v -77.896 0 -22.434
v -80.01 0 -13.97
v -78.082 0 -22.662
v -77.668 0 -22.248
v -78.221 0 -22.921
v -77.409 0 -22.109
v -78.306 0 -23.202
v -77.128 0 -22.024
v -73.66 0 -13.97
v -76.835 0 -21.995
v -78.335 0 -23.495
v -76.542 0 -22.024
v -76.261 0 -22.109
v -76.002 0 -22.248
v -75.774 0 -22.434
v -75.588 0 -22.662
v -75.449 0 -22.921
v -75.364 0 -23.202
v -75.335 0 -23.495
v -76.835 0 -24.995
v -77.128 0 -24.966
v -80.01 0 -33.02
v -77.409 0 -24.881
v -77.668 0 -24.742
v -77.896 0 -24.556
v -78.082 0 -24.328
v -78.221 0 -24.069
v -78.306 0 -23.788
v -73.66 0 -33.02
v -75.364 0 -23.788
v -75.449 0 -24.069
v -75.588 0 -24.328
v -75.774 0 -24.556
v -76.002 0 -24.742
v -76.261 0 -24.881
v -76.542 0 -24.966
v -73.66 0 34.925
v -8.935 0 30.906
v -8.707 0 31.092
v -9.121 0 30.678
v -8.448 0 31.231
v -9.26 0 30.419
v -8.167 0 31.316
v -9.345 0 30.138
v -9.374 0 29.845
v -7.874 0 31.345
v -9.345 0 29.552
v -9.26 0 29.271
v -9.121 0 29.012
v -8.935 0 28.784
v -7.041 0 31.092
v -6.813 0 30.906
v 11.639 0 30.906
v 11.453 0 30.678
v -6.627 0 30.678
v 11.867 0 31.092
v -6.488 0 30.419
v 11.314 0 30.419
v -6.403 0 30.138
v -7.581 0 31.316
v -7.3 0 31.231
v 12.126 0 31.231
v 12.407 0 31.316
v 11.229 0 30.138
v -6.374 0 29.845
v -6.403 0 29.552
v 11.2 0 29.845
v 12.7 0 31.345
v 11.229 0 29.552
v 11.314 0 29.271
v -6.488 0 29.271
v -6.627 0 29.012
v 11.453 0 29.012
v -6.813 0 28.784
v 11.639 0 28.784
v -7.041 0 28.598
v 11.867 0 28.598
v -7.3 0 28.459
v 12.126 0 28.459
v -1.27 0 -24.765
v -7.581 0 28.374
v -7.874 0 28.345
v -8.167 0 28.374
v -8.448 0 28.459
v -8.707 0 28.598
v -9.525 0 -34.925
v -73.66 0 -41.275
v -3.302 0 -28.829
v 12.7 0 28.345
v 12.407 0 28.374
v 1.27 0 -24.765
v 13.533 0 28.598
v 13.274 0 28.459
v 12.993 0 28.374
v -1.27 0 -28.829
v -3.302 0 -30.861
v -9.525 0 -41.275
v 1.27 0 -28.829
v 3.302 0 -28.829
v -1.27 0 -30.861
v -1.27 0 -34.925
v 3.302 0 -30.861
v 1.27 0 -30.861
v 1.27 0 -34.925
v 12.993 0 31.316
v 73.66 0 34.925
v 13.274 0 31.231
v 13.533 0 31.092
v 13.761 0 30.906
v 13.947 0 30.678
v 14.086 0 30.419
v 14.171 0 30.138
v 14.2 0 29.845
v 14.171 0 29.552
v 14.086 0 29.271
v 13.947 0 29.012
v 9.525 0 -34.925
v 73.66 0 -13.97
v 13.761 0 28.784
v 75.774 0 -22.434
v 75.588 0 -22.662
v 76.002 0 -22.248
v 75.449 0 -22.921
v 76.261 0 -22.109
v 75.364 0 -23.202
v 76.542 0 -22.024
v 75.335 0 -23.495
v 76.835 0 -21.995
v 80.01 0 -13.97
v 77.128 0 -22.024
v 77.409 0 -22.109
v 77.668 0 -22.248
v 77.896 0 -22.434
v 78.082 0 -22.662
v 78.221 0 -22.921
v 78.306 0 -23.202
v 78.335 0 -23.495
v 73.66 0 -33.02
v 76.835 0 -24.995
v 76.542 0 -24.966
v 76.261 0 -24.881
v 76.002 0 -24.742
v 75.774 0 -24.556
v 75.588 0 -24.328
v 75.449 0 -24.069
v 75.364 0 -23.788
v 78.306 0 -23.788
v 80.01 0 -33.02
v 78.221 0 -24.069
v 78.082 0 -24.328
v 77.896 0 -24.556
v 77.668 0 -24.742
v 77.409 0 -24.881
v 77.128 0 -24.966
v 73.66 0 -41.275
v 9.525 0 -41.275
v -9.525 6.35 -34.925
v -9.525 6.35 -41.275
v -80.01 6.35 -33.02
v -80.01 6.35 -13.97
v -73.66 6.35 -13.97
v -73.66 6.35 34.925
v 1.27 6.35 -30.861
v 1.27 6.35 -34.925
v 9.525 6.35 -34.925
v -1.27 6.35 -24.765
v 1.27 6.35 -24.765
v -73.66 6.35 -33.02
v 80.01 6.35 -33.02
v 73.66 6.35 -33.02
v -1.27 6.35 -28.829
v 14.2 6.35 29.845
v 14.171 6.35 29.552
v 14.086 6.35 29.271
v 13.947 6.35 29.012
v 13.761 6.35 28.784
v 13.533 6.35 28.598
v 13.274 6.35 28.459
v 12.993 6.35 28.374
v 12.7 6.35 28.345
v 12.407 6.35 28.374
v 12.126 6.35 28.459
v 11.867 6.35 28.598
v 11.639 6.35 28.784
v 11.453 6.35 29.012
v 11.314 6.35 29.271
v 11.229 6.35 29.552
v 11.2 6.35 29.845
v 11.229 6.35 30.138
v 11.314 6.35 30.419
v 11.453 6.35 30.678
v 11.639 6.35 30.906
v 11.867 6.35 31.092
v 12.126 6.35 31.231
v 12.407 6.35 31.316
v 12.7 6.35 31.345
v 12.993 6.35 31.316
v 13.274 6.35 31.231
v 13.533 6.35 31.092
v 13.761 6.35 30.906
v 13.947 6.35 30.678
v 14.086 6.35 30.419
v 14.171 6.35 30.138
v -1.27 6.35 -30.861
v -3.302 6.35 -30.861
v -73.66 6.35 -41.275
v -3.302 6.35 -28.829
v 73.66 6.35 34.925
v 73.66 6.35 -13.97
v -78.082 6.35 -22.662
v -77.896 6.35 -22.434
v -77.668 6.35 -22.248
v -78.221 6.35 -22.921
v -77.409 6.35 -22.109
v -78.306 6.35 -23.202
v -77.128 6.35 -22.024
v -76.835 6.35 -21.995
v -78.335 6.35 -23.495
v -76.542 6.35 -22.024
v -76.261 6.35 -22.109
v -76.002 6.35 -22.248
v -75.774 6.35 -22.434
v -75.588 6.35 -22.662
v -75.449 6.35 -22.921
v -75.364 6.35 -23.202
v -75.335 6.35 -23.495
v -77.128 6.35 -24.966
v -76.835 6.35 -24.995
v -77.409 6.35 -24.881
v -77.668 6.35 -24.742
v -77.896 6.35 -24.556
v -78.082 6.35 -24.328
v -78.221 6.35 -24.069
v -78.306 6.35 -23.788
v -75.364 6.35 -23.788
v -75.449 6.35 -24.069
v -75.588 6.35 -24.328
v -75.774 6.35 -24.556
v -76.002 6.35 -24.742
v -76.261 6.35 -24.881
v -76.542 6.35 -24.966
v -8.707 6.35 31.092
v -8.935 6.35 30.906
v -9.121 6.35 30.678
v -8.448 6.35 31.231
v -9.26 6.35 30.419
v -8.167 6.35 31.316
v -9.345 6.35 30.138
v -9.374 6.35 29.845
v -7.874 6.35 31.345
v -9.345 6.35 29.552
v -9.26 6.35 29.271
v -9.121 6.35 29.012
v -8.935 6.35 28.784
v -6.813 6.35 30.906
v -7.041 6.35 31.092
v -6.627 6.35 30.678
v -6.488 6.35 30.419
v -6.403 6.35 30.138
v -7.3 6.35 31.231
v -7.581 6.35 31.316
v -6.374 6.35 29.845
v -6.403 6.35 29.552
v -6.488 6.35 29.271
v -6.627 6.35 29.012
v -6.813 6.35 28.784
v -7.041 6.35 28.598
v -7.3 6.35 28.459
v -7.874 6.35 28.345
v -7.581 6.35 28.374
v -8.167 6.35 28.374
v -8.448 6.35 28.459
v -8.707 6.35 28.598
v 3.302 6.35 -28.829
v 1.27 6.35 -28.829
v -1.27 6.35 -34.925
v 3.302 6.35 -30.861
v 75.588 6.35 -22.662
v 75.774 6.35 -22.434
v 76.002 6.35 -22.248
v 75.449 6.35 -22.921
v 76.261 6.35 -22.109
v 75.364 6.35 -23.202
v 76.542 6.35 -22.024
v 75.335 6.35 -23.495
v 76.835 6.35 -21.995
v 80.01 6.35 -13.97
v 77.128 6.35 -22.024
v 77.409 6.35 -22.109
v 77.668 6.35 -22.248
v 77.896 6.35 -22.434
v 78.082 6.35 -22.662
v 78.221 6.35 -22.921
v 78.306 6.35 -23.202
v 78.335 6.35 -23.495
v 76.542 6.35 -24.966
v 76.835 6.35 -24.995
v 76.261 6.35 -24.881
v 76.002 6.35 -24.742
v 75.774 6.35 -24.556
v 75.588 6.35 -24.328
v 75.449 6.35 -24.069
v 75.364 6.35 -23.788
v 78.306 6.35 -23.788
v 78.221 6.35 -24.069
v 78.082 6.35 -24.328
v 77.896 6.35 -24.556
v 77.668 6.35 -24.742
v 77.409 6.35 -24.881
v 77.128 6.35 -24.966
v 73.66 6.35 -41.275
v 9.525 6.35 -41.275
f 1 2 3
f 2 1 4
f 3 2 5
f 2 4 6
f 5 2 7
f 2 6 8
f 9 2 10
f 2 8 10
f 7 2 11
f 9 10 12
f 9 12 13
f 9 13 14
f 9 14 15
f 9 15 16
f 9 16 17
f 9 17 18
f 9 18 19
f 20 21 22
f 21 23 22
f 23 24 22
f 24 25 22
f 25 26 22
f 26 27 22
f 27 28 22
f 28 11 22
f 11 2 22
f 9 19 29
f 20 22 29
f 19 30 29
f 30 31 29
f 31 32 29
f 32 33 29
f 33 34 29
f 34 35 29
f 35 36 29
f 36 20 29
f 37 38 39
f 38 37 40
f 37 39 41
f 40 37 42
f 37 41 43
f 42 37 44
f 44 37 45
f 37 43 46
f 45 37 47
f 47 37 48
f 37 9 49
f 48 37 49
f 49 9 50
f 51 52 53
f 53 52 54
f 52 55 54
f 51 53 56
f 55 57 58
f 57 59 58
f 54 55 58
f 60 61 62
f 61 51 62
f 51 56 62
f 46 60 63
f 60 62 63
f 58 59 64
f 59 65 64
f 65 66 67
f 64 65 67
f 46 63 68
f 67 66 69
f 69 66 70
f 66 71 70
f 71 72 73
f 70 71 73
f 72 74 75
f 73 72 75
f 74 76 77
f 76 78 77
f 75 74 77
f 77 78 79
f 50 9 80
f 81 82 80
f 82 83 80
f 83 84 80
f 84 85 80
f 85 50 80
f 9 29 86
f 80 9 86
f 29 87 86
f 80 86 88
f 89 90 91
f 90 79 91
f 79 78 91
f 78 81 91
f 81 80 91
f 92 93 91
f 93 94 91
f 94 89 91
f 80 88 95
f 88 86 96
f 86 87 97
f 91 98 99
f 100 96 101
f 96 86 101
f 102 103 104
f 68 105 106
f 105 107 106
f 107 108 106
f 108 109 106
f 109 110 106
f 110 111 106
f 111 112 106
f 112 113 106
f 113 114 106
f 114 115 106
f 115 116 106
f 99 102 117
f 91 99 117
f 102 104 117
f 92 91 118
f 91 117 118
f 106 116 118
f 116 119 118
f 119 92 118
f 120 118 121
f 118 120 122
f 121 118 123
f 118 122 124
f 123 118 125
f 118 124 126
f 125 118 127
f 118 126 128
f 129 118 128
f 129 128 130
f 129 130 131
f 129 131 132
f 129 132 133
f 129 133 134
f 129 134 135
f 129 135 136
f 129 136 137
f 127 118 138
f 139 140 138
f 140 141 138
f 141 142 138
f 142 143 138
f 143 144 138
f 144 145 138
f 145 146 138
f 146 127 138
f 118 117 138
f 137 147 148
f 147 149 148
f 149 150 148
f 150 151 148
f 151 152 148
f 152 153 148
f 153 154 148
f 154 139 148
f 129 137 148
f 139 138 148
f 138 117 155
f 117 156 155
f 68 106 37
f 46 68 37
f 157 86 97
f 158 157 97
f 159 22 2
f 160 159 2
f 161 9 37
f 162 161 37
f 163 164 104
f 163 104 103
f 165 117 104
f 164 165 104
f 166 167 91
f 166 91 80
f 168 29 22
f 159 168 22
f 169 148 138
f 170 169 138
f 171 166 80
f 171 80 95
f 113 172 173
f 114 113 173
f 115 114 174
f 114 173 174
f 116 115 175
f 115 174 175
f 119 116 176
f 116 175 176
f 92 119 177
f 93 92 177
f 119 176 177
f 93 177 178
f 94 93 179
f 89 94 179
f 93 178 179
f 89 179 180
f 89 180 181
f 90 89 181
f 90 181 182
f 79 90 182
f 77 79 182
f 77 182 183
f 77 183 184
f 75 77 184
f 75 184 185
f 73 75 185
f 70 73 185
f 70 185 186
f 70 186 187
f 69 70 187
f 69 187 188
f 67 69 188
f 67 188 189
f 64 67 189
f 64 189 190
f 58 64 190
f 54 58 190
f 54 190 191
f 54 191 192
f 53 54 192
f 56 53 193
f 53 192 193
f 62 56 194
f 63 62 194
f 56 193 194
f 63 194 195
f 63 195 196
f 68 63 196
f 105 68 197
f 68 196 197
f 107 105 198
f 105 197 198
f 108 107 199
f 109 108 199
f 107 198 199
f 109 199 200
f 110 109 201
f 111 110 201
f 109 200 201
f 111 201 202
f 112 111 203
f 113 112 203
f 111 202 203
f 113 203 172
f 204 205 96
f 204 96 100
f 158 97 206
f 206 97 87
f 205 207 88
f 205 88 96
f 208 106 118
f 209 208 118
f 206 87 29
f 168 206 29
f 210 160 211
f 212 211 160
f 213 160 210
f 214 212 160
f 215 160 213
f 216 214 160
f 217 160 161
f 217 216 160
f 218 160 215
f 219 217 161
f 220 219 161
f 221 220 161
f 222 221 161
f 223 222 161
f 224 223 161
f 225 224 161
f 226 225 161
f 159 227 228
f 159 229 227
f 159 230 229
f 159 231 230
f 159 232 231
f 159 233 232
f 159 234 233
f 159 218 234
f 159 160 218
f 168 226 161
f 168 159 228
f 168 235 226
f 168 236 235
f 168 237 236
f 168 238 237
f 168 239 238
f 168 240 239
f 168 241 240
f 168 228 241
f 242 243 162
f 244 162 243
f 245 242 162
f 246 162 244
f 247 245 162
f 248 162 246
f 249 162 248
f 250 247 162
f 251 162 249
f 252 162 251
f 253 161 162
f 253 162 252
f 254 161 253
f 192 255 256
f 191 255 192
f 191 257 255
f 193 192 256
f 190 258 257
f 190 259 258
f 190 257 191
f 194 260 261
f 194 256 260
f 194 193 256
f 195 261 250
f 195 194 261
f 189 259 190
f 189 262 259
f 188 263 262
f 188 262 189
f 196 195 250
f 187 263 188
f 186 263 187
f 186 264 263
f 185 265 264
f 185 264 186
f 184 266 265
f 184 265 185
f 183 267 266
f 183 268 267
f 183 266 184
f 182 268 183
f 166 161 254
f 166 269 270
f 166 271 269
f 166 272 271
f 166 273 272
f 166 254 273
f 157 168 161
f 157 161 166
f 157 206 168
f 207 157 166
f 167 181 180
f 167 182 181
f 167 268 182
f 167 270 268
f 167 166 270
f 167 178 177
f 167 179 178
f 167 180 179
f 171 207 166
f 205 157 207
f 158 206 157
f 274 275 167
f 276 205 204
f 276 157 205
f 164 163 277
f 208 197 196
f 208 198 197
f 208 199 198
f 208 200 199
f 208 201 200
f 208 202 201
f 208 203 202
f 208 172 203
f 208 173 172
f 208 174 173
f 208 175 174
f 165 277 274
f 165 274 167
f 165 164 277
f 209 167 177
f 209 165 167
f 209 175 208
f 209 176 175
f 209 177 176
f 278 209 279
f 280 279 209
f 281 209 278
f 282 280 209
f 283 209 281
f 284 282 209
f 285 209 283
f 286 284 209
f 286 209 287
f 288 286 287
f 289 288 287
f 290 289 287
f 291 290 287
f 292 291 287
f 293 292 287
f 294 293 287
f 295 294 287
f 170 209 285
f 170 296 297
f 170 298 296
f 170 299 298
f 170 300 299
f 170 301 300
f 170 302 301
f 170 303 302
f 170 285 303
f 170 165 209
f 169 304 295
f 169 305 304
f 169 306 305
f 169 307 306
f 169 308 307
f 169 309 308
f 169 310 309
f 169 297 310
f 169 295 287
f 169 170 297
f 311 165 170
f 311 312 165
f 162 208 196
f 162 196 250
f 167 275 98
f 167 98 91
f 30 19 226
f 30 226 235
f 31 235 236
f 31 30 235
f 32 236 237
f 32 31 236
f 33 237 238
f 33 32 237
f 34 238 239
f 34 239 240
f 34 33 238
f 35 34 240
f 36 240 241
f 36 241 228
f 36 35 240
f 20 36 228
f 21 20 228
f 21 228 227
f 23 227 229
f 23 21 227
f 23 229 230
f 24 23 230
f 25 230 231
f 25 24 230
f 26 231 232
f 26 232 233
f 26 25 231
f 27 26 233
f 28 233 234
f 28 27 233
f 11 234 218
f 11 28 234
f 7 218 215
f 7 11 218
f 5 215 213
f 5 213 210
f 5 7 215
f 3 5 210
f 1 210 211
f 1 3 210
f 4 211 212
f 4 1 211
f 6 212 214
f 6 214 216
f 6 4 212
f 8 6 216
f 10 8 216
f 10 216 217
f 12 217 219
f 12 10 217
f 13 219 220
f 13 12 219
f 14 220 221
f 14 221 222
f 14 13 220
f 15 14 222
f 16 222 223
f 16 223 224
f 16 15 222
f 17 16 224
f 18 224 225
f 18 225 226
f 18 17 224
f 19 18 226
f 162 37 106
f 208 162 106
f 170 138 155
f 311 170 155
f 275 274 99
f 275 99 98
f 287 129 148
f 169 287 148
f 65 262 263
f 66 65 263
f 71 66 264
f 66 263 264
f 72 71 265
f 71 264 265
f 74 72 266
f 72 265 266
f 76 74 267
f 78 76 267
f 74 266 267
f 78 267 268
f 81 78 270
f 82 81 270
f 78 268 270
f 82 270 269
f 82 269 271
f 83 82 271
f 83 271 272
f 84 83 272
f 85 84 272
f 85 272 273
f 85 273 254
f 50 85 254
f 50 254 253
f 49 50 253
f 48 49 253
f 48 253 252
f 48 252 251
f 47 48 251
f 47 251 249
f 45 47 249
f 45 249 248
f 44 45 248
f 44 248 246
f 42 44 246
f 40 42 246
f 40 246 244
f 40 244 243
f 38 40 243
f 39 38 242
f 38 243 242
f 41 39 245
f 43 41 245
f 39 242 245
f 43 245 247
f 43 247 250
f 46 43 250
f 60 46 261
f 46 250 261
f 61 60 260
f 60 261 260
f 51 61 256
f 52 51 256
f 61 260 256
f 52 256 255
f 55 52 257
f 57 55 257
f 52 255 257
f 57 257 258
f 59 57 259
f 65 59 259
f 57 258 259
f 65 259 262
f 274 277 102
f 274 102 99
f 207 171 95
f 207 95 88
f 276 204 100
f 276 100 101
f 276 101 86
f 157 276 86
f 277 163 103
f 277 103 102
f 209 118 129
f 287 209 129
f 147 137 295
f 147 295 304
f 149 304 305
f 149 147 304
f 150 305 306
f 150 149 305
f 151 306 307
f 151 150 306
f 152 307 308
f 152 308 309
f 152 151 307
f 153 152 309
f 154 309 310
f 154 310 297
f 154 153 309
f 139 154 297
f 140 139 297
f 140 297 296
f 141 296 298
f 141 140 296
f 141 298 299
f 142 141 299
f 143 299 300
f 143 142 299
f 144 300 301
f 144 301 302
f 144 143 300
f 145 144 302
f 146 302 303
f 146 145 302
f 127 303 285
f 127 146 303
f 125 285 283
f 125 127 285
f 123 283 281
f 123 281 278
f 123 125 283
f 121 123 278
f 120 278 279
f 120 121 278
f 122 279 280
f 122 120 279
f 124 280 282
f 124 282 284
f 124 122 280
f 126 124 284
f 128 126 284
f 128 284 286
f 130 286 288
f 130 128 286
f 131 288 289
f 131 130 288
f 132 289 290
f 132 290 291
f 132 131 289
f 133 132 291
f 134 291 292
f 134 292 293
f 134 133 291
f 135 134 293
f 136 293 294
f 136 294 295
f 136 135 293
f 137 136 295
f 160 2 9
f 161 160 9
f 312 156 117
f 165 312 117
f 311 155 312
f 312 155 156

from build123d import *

# Parameters (mm, degrees)
SKETCH1_R           = 1.5
BOSS_EXTRUDE1_DEPTH = 6.35
SKETCH2_R           = 1.5
CUT_EXTRUDE1_DEPTH  = 7.35
CUT_EXTRUDE2_DEPTH  = 7.35


with BuildPart() as part:
    # Sketch1 → Boss-Extrude1 (new body)
    with BuildSketch(Plane(origin=(0, 0, 0), x_dir=(1, 0, 0), z_dir=(0, 1, 0))):
        Polygon((-73.66, -34.925), (73.66, -34.925), (73.66, 13.97), (80.01, 13.97), (80.01, 33.02), (73.66, 33.02), (73.66, 34.925), (73.66, 41.275), (9.525, 41.275), (9.525, 34.925), (-9.525, 34.925), (-9.525, 41.275), (-73.66, 41.275), (-73.66, 34.925), (-73.66, 33.02), (-80.01, 33.02), (-80.01, 13.97), (-73.66, 13.97), align=None)
        with Locations((-76.835, 23.495)):
            Circle(SKETCH1_R, mode=Mode.SUBTRACT)
        with Locations((76.835, 23.495)):
            Circle(SKETCH1_R, mode=Mode.SUBTRACT)
    extrude(amount=BOSS_EXTRUDE1_DEPTH)

    # Sketch2 → Cut-Extrude1 (cut, through all)
    with BuildSketch(Plane(origin=(0, 6.35, 0), x_dir=(1, 0, 0), z_dir=(0, 1, 0))):
        with Locations((12.7, -29.845)):
            Circle(SKETCH2_R)
        with Locations((-7.874, -29.845)):
            Circle(SKETCH2_R)
    extrude(amount=-CUT_EXTRUDE1_DEPTH, mode=Mode.SUBTRACT)

    # Sketch3 → Cut-Extrude2 (cut, through all)
    with BuildSketch(Plane(origin=(0, 6.35, 0), x_dir=(1, 0, 0), z_dir=(0, 1, 0))):
        Polygon((-1.27, 34.925), (1.27, 34.925), (1.27, 30.861), (3.302, 30.861), (3.302, 28.829), (1.27, 28.829), (1.27, 24.765), (-1.27, 24.765), (-1.27, 28.829), (-3.302, 28.829), (-3.302, 30.861), (-1.27, 30.861), align=None)
    extrude(amount=-CUT_EXTRUDE2_DEPTH, mode=Mode.SUBTRACT)


solid = part.part
